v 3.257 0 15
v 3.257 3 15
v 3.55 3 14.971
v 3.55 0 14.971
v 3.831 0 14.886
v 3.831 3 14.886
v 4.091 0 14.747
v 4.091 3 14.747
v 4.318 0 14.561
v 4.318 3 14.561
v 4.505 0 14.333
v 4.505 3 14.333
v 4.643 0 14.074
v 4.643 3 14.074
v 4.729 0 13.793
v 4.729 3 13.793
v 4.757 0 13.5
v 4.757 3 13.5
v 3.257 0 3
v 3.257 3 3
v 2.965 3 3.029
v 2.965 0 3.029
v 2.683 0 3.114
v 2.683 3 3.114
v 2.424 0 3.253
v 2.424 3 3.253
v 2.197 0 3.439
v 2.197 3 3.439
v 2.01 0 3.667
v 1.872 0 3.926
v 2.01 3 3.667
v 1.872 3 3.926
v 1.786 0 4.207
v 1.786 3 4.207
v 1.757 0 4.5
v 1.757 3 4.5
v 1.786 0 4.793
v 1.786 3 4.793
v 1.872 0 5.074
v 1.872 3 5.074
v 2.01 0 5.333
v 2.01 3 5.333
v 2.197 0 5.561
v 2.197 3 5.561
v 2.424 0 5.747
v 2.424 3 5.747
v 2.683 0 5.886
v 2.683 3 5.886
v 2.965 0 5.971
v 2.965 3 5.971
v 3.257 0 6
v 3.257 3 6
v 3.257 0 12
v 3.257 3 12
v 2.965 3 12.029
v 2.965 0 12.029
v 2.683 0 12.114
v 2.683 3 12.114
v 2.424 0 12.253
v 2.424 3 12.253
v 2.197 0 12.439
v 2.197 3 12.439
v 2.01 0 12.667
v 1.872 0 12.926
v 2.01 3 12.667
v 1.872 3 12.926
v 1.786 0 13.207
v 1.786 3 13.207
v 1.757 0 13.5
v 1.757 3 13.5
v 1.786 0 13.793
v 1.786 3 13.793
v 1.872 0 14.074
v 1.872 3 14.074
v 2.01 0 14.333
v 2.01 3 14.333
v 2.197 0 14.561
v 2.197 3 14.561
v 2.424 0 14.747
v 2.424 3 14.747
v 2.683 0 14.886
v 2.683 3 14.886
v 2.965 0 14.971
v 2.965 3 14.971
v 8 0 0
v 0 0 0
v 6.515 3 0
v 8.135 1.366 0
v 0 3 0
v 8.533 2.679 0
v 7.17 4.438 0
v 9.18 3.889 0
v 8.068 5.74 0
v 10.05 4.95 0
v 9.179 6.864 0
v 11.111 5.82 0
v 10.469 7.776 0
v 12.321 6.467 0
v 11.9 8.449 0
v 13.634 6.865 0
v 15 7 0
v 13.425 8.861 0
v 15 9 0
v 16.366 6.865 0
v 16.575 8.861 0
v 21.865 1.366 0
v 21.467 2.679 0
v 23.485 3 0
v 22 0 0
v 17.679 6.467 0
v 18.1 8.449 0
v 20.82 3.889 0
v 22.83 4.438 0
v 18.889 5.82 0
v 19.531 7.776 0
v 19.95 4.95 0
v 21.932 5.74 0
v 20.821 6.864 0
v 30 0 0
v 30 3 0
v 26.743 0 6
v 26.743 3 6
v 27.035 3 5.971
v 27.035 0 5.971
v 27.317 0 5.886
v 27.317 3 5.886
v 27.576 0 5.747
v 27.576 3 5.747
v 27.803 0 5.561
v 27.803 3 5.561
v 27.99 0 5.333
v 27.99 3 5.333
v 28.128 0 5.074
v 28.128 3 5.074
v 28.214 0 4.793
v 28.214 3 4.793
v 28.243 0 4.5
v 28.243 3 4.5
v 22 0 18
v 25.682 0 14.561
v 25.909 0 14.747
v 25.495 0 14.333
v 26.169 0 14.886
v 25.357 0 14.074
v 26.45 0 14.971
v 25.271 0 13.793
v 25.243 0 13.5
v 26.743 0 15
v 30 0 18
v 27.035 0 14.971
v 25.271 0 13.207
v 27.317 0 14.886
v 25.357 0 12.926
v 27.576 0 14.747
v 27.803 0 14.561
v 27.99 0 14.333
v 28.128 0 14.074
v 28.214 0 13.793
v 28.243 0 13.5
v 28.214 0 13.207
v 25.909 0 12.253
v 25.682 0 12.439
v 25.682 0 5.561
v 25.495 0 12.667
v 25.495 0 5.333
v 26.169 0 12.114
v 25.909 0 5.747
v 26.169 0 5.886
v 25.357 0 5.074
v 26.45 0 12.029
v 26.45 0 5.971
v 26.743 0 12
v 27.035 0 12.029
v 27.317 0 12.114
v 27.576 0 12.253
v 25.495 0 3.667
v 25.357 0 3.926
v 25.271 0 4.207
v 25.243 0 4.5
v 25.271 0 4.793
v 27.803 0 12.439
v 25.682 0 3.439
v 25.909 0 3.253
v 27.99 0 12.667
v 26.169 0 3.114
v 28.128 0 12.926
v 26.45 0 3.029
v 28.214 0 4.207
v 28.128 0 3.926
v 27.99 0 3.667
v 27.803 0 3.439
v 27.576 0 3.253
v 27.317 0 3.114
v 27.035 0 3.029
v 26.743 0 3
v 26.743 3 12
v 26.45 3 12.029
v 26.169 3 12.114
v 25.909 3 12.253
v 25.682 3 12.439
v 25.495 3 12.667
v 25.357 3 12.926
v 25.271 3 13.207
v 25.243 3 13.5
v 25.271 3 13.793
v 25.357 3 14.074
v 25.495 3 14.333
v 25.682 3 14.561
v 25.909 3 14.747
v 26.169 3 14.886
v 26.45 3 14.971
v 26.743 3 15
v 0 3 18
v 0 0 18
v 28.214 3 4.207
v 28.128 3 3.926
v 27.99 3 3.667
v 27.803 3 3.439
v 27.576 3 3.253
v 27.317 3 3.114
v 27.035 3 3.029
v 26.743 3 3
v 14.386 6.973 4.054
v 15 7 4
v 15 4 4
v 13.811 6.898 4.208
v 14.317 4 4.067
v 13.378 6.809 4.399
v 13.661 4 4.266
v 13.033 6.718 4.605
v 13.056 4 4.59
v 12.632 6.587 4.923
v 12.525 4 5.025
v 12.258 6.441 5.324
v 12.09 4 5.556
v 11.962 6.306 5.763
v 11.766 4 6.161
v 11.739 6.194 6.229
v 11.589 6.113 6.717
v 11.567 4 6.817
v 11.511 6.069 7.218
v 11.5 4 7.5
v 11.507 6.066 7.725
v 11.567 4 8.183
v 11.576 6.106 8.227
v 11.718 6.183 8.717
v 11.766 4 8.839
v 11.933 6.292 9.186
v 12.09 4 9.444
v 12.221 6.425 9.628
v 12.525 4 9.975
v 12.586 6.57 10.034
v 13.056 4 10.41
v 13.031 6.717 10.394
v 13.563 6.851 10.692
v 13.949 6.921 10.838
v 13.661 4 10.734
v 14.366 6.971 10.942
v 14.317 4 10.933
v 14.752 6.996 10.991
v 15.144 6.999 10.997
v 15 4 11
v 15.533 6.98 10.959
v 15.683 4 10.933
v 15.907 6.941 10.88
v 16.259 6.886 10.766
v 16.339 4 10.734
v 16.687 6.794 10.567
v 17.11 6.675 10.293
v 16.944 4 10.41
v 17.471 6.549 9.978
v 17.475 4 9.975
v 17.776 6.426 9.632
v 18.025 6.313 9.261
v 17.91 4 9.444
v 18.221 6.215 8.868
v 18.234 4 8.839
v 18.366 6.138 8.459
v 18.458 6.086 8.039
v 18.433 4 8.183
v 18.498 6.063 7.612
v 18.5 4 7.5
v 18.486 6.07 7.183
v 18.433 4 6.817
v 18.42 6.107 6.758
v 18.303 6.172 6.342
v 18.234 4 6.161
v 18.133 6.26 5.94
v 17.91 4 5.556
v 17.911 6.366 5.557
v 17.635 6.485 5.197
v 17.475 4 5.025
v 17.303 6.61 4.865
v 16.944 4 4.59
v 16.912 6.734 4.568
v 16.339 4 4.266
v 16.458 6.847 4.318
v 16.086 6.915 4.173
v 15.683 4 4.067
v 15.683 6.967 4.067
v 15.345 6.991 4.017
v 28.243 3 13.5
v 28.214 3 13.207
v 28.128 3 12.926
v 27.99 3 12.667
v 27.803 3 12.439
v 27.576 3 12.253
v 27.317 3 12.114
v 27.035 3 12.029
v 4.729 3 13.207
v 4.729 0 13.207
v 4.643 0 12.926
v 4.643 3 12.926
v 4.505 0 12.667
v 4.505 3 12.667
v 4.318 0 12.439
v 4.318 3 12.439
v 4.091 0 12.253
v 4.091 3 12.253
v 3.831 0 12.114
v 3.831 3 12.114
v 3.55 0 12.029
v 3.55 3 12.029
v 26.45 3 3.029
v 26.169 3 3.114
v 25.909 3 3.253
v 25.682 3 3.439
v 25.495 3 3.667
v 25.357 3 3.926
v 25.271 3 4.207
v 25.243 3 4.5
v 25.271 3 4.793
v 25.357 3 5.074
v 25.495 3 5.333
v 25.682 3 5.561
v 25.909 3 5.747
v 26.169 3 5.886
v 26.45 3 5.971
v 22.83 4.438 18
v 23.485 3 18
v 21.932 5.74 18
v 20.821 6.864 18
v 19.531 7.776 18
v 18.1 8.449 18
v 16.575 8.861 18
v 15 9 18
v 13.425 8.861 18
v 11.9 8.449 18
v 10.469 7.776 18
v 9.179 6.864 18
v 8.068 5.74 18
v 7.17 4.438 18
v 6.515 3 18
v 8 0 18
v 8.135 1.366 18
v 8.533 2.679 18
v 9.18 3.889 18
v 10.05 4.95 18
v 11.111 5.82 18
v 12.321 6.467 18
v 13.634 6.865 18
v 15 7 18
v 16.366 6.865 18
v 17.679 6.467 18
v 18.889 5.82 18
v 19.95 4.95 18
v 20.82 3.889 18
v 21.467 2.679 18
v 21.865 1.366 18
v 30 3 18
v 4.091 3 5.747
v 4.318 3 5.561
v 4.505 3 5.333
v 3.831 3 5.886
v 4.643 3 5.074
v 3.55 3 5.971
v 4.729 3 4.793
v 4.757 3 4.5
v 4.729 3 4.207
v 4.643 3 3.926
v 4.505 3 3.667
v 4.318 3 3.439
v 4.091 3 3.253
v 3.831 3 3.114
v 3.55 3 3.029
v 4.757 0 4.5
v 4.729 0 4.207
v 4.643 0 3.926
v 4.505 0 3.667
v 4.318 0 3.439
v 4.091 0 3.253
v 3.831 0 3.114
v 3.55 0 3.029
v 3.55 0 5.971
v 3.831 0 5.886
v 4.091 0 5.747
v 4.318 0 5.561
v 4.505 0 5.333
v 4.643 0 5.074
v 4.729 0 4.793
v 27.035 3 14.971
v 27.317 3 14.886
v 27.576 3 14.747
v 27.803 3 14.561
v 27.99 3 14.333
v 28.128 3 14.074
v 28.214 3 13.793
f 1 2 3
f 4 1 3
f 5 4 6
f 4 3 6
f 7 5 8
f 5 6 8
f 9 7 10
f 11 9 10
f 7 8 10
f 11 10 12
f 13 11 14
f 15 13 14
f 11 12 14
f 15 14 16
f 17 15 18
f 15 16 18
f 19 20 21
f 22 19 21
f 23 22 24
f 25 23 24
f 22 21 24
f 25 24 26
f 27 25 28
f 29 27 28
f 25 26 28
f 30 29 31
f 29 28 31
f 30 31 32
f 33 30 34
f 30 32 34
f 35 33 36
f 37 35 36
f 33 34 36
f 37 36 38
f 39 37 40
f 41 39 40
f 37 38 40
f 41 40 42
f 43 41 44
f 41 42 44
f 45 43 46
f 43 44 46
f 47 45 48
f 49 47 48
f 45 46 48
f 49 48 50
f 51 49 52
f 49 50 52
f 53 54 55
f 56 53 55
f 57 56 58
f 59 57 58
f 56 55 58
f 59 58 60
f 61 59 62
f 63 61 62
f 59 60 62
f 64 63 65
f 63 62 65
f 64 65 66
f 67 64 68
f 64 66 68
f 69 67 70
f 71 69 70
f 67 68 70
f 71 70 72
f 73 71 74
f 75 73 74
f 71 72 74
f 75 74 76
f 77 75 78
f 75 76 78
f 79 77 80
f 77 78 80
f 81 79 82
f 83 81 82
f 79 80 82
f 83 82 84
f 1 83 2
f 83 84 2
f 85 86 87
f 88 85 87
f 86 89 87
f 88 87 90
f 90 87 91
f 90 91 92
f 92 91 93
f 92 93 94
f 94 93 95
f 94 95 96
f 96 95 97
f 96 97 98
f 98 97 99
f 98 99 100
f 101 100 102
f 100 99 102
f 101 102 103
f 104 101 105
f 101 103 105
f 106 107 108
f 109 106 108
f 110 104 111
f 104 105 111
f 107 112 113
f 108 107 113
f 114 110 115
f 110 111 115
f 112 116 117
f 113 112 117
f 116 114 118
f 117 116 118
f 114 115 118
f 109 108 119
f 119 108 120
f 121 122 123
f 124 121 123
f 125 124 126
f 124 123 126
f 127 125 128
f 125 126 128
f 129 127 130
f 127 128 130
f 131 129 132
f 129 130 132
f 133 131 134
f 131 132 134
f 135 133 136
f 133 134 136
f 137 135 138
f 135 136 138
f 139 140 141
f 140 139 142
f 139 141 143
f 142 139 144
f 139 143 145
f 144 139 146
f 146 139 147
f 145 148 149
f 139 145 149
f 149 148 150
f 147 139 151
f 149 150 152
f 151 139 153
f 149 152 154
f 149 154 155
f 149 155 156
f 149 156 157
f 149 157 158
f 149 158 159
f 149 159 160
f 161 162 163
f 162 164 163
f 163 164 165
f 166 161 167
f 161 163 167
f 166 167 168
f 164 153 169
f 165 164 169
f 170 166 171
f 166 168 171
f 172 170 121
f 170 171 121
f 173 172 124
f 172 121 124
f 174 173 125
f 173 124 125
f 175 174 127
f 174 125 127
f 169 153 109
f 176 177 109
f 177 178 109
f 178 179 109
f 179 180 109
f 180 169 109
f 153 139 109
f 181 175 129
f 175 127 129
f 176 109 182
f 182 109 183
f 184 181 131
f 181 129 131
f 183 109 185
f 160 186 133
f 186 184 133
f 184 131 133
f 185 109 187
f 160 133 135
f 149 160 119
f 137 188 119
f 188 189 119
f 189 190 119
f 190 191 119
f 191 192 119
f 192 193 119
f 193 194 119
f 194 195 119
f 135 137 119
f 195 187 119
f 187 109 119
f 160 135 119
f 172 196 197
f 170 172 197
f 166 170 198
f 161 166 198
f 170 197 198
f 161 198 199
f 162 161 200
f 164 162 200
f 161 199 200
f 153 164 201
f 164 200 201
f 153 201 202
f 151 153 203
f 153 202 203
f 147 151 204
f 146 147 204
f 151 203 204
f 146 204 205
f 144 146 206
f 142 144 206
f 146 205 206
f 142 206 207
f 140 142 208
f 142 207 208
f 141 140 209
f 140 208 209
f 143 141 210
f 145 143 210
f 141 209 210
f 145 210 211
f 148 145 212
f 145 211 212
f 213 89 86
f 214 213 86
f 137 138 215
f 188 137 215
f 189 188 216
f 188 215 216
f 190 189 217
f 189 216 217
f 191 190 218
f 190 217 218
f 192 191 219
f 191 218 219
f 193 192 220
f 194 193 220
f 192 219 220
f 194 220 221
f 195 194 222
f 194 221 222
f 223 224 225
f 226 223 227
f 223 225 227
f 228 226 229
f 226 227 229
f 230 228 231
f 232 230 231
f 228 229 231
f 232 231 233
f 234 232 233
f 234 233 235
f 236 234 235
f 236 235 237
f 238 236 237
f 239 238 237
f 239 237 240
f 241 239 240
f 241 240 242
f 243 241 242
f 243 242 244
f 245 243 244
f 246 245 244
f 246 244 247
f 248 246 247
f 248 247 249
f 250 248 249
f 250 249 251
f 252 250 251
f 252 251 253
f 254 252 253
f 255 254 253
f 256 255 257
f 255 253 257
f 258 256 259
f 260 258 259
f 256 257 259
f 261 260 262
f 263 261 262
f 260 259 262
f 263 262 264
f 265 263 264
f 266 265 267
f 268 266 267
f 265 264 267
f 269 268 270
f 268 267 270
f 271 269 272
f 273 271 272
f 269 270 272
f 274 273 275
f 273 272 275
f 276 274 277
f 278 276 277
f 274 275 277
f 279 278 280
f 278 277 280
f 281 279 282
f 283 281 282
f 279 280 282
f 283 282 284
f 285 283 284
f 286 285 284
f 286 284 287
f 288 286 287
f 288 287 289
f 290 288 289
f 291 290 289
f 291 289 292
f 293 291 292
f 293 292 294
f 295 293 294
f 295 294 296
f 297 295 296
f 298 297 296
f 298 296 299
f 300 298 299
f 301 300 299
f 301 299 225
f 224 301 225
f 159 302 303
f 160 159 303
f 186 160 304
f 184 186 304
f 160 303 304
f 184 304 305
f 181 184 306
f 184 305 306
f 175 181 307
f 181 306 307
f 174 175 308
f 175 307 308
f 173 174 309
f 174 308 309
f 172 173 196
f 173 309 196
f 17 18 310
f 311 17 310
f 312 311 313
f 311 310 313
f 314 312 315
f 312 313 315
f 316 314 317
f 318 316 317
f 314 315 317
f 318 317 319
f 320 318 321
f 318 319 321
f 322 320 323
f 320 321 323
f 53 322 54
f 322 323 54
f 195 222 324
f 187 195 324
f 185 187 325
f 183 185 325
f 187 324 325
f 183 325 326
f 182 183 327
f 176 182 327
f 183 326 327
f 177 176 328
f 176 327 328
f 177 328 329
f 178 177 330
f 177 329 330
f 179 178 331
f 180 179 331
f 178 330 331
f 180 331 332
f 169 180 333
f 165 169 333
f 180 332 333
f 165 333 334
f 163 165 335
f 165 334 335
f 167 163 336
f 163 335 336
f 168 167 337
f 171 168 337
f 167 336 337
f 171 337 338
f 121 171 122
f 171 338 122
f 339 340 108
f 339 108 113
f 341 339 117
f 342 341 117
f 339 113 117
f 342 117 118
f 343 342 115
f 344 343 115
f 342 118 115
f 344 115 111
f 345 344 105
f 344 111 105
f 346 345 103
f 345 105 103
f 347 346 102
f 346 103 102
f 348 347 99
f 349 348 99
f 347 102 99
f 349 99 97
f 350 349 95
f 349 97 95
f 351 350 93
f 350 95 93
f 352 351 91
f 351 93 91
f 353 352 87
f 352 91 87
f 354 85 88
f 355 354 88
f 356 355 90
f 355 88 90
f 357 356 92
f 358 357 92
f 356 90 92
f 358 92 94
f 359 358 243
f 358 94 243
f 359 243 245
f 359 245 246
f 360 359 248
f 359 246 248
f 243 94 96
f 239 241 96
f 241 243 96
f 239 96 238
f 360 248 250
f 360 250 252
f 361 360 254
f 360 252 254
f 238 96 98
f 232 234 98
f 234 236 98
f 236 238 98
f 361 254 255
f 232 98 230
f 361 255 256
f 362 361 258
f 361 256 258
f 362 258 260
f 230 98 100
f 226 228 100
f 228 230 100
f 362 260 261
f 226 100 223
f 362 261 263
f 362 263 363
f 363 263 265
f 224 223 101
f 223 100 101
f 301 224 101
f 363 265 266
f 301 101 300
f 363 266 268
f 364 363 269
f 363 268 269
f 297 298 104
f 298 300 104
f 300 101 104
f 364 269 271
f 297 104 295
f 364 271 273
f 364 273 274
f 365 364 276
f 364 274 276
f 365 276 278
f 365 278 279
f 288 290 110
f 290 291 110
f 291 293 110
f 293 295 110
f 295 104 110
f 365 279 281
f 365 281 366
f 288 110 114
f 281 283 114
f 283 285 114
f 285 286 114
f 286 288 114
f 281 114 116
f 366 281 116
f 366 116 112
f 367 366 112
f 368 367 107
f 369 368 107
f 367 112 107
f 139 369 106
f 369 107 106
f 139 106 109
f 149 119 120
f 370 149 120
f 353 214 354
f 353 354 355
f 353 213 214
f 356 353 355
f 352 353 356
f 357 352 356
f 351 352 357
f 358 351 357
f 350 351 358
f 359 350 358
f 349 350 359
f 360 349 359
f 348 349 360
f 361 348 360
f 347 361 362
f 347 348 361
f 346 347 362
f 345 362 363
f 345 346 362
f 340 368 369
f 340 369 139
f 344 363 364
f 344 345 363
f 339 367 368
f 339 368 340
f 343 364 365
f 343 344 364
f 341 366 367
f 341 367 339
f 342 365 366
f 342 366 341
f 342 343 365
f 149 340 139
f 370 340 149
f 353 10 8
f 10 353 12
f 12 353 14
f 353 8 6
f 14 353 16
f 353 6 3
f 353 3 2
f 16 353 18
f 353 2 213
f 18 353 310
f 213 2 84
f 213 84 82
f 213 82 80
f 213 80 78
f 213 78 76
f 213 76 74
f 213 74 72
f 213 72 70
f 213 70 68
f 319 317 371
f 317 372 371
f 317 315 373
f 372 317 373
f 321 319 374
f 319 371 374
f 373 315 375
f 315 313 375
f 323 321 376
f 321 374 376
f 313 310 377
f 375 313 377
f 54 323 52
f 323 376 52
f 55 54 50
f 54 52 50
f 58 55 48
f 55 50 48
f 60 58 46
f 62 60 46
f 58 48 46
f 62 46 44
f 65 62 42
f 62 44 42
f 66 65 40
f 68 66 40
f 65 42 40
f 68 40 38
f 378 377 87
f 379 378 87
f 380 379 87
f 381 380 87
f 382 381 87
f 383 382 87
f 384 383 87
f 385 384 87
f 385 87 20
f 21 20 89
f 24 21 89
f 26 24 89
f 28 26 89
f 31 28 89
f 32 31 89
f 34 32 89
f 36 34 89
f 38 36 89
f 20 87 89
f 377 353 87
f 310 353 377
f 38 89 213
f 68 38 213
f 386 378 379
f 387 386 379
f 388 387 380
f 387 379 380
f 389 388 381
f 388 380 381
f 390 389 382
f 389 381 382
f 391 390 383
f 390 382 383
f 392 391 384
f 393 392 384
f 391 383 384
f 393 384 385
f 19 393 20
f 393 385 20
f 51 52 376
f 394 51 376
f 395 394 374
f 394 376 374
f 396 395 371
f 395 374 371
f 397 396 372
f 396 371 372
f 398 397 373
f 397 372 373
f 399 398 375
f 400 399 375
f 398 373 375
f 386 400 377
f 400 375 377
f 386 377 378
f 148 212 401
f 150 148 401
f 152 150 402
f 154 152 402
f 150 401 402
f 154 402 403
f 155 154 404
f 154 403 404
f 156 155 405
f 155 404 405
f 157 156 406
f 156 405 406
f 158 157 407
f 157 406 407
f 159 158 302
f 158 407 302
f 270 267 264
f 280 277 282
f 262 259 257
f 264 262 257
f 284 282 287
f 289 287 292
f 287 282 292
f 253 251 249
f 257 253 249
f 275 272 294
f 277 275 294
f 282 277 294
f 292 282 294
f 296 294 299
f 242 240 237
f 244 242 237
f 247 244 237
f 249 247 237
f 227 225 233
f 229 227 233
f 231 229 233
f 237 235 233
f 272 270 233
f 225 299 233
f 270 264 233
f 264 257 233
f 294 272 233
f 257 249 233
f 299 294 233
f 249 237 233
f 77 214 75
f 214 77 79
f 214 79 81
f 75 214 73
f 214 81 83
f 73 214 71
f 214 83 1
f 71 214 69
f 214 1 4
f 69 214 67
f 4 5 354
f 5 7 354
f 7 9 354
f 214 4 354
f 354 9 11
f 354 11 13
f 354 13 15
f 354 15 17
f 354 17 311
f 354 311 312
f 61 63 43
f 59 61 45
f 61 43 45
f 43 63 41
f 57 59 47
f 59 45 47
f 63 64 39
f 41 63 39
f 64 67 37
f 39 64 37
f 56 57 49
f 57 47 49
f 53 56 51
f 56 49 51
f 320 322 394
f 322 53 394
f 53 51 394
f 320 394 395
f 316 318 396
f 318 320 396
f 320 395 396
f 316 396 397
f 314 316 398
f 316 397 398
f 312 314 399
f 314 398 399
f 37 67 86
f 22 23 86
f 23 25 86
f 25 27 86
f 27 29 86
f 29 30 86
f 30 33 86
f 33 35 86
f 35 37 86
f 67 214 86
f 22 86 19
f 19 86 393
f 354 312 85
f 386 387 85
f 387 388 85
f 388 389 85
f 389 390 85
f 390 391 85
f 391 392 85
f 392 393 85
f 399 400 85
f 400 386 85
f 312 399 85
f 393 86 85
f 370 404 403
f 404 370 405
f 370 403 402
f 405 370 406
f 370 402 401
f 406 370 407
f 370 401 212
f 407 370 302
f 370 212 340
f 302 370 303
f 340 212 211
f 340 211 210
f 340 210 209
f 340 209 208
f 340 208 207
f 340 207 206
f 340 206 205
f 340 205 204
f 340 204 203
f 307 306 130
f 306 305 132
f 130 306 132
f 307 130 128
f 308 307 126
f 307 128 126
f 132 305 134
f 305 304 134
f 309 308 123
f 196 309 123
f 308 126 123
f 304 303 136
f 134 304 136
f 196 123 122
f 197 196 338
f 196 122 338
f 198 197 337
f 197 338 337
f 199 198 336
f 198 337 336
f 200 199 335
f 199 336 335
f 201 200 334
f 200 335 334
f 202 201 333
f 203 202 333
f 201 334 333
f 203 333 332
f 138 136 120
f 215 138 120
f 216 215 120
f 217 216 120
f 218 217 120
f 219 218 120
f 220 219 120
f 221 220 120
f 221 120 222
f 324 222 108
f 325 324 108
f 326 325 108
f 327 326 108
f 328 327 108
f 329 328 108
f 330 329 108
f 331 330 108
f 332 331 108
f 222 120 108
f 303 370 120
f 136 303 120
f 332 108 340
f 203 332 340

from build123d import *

# Parameters (mm, degrees)
EXTRUDE_1_DEPTH      = 18
EXTRUDE_2_REACH      = 37.341
EXTRUDE_2_END_RADIUS = 7
SKETCH_3_R           = 3.5
CUT_EXTRUDE_1_DEPTH  = 3


with BuildPart() as part:
    # 草图1 → 凸台-拉伸1 (new body)
    with BuildSketch(Plane.XY):
        with BuildLine():
            Line((0, 0), (8, 0))
            ThreePointArc((8, 0), (15, 7), (22, 0))
            Line((22, 0), (30, 0))
            Line((30, 0), (30, 3))
            Line((30, 3), (23.485281374, 3))
            ThreePointArc((23.485281374, 3), (15, 9), (6.514718626, 3))
            Line((6.514718626, 3), (0, 3))
            Line((0, 3), (0, 0))
        make_face()
    extrude(amount=EXTRUDE_1_DEPTH)

    # 凸台-拉伸2: up to this cylinder (the profile starts inside it)
    extrude_2_end = Plane(origin=(15, 0, 7.5), z_dir=(0, 0, -1)) * Cylinder(EXTRUDE_2_END_RADIUS, 89.682, mode=Mode.PRIVATE)
    # 草图3 → 凸台-拉伸2 (add, up to the surface)
    with BuildSketch(Plane(origin=(0, 4, 0), x_dir=(1, 0, 0), z_dir=(0, 1, 0)), mode=Mode.PRIVATE) as extrude_2_sk1:
        with Locations(Location((15, -7.5, 0), (0, 0, 90))):
            Circle(SKETCH_3_R)
    extrude_2_tool1 = extrude(extrude_2_sk1.sketch, amount=EXTRUDE_2_REACH, mode=Mode.PRIVATE) & extrude_2_end
    add(extrude_2_tool1.solids().sort_by_distance((15, 4, 7.5))[0])

    # 草图4 → 切除-拉伸1 (cut)
    with BuildSketch(Plane(origin=(0, 3, 0), x_dir=(1, 0, 0), z_dir=(0, 1, 0))):
        with BuildLine():
            ThreePointArc((4.757359313, -4.5), (4.318019485, -3.439339828), (3.257359313, -3))
            Line((3.257359313, -3), (3.257359313, -6))
            ThreePointArc((3.257359313, -6), (4.318019485, -5.560660172), (4.757359313, -4.5))
        make_face()
        with BuildLine():
            Line((3.257359313, -6), (3.257359313, -3))
            ThreePointArc((3.257359313, -3), (1.757359313, -4.5), (3.257359313, -6))
        make_face()
        with BuildLine():
            ThreePointArc((4.757359313, -13.5), (4.318019485, -12.439339828), (3.257359313, -12))
            Line((3.257359313, -12), (3.257359313, -15))
            ThreePointArc((3.257359313, -15), (4.318019485, -14.560660172), (4.757359313, -13.5))
        make_face()
        with BuildLine():
            Line((3.257359313, -15), (3.257359313, -12))
            ThreePointArc((3.257359313, -12), (1.757359313, -13.5), (3.257359313, -15))
        make_face()
        with BuildLine():
            ThreePointArc((28.242640687, -4.5), (27.803300859, -3.439339828), (26.742640687, -3))
            Line((26.742640687, -3), (26.742640687, -6))
            ThreePointArc((26.742640687, -6), (27.803300859, -5.560660172), (28.242640687, -4.5))
        make_face()
        with BuildLine():
            Line((26.742640687, -6), (26.742640687, -3))
            ThreePointArc((26.742640687, -3), (25.242640687, -4.5), (26.742640687, -6))
        make_face()
        with BuildLine():
            ThreePointArc((28.242640687, -13.5), (27.803300859, -12.439339828), (26.742640687, -12))
            Line((26.742640687, -12), (26.742640687, -15))
            ThreePointArc((26.742640687, -15), (27.803300859, -14.560660172), (28.242640687, -13.5))
        make_face()
        with BuildLine():
            Line((26.742640687, -15), (26.742640687, -12))
            ThreePointArc((26.742640687, -12), (25.242640687, -13.5), (26.742640687, -15))
        make_face()
    extrude(amount=-CUT_EXTRUDE_1_DEPTH, mode=Mode.SUBTRACT)


solid = part.part
